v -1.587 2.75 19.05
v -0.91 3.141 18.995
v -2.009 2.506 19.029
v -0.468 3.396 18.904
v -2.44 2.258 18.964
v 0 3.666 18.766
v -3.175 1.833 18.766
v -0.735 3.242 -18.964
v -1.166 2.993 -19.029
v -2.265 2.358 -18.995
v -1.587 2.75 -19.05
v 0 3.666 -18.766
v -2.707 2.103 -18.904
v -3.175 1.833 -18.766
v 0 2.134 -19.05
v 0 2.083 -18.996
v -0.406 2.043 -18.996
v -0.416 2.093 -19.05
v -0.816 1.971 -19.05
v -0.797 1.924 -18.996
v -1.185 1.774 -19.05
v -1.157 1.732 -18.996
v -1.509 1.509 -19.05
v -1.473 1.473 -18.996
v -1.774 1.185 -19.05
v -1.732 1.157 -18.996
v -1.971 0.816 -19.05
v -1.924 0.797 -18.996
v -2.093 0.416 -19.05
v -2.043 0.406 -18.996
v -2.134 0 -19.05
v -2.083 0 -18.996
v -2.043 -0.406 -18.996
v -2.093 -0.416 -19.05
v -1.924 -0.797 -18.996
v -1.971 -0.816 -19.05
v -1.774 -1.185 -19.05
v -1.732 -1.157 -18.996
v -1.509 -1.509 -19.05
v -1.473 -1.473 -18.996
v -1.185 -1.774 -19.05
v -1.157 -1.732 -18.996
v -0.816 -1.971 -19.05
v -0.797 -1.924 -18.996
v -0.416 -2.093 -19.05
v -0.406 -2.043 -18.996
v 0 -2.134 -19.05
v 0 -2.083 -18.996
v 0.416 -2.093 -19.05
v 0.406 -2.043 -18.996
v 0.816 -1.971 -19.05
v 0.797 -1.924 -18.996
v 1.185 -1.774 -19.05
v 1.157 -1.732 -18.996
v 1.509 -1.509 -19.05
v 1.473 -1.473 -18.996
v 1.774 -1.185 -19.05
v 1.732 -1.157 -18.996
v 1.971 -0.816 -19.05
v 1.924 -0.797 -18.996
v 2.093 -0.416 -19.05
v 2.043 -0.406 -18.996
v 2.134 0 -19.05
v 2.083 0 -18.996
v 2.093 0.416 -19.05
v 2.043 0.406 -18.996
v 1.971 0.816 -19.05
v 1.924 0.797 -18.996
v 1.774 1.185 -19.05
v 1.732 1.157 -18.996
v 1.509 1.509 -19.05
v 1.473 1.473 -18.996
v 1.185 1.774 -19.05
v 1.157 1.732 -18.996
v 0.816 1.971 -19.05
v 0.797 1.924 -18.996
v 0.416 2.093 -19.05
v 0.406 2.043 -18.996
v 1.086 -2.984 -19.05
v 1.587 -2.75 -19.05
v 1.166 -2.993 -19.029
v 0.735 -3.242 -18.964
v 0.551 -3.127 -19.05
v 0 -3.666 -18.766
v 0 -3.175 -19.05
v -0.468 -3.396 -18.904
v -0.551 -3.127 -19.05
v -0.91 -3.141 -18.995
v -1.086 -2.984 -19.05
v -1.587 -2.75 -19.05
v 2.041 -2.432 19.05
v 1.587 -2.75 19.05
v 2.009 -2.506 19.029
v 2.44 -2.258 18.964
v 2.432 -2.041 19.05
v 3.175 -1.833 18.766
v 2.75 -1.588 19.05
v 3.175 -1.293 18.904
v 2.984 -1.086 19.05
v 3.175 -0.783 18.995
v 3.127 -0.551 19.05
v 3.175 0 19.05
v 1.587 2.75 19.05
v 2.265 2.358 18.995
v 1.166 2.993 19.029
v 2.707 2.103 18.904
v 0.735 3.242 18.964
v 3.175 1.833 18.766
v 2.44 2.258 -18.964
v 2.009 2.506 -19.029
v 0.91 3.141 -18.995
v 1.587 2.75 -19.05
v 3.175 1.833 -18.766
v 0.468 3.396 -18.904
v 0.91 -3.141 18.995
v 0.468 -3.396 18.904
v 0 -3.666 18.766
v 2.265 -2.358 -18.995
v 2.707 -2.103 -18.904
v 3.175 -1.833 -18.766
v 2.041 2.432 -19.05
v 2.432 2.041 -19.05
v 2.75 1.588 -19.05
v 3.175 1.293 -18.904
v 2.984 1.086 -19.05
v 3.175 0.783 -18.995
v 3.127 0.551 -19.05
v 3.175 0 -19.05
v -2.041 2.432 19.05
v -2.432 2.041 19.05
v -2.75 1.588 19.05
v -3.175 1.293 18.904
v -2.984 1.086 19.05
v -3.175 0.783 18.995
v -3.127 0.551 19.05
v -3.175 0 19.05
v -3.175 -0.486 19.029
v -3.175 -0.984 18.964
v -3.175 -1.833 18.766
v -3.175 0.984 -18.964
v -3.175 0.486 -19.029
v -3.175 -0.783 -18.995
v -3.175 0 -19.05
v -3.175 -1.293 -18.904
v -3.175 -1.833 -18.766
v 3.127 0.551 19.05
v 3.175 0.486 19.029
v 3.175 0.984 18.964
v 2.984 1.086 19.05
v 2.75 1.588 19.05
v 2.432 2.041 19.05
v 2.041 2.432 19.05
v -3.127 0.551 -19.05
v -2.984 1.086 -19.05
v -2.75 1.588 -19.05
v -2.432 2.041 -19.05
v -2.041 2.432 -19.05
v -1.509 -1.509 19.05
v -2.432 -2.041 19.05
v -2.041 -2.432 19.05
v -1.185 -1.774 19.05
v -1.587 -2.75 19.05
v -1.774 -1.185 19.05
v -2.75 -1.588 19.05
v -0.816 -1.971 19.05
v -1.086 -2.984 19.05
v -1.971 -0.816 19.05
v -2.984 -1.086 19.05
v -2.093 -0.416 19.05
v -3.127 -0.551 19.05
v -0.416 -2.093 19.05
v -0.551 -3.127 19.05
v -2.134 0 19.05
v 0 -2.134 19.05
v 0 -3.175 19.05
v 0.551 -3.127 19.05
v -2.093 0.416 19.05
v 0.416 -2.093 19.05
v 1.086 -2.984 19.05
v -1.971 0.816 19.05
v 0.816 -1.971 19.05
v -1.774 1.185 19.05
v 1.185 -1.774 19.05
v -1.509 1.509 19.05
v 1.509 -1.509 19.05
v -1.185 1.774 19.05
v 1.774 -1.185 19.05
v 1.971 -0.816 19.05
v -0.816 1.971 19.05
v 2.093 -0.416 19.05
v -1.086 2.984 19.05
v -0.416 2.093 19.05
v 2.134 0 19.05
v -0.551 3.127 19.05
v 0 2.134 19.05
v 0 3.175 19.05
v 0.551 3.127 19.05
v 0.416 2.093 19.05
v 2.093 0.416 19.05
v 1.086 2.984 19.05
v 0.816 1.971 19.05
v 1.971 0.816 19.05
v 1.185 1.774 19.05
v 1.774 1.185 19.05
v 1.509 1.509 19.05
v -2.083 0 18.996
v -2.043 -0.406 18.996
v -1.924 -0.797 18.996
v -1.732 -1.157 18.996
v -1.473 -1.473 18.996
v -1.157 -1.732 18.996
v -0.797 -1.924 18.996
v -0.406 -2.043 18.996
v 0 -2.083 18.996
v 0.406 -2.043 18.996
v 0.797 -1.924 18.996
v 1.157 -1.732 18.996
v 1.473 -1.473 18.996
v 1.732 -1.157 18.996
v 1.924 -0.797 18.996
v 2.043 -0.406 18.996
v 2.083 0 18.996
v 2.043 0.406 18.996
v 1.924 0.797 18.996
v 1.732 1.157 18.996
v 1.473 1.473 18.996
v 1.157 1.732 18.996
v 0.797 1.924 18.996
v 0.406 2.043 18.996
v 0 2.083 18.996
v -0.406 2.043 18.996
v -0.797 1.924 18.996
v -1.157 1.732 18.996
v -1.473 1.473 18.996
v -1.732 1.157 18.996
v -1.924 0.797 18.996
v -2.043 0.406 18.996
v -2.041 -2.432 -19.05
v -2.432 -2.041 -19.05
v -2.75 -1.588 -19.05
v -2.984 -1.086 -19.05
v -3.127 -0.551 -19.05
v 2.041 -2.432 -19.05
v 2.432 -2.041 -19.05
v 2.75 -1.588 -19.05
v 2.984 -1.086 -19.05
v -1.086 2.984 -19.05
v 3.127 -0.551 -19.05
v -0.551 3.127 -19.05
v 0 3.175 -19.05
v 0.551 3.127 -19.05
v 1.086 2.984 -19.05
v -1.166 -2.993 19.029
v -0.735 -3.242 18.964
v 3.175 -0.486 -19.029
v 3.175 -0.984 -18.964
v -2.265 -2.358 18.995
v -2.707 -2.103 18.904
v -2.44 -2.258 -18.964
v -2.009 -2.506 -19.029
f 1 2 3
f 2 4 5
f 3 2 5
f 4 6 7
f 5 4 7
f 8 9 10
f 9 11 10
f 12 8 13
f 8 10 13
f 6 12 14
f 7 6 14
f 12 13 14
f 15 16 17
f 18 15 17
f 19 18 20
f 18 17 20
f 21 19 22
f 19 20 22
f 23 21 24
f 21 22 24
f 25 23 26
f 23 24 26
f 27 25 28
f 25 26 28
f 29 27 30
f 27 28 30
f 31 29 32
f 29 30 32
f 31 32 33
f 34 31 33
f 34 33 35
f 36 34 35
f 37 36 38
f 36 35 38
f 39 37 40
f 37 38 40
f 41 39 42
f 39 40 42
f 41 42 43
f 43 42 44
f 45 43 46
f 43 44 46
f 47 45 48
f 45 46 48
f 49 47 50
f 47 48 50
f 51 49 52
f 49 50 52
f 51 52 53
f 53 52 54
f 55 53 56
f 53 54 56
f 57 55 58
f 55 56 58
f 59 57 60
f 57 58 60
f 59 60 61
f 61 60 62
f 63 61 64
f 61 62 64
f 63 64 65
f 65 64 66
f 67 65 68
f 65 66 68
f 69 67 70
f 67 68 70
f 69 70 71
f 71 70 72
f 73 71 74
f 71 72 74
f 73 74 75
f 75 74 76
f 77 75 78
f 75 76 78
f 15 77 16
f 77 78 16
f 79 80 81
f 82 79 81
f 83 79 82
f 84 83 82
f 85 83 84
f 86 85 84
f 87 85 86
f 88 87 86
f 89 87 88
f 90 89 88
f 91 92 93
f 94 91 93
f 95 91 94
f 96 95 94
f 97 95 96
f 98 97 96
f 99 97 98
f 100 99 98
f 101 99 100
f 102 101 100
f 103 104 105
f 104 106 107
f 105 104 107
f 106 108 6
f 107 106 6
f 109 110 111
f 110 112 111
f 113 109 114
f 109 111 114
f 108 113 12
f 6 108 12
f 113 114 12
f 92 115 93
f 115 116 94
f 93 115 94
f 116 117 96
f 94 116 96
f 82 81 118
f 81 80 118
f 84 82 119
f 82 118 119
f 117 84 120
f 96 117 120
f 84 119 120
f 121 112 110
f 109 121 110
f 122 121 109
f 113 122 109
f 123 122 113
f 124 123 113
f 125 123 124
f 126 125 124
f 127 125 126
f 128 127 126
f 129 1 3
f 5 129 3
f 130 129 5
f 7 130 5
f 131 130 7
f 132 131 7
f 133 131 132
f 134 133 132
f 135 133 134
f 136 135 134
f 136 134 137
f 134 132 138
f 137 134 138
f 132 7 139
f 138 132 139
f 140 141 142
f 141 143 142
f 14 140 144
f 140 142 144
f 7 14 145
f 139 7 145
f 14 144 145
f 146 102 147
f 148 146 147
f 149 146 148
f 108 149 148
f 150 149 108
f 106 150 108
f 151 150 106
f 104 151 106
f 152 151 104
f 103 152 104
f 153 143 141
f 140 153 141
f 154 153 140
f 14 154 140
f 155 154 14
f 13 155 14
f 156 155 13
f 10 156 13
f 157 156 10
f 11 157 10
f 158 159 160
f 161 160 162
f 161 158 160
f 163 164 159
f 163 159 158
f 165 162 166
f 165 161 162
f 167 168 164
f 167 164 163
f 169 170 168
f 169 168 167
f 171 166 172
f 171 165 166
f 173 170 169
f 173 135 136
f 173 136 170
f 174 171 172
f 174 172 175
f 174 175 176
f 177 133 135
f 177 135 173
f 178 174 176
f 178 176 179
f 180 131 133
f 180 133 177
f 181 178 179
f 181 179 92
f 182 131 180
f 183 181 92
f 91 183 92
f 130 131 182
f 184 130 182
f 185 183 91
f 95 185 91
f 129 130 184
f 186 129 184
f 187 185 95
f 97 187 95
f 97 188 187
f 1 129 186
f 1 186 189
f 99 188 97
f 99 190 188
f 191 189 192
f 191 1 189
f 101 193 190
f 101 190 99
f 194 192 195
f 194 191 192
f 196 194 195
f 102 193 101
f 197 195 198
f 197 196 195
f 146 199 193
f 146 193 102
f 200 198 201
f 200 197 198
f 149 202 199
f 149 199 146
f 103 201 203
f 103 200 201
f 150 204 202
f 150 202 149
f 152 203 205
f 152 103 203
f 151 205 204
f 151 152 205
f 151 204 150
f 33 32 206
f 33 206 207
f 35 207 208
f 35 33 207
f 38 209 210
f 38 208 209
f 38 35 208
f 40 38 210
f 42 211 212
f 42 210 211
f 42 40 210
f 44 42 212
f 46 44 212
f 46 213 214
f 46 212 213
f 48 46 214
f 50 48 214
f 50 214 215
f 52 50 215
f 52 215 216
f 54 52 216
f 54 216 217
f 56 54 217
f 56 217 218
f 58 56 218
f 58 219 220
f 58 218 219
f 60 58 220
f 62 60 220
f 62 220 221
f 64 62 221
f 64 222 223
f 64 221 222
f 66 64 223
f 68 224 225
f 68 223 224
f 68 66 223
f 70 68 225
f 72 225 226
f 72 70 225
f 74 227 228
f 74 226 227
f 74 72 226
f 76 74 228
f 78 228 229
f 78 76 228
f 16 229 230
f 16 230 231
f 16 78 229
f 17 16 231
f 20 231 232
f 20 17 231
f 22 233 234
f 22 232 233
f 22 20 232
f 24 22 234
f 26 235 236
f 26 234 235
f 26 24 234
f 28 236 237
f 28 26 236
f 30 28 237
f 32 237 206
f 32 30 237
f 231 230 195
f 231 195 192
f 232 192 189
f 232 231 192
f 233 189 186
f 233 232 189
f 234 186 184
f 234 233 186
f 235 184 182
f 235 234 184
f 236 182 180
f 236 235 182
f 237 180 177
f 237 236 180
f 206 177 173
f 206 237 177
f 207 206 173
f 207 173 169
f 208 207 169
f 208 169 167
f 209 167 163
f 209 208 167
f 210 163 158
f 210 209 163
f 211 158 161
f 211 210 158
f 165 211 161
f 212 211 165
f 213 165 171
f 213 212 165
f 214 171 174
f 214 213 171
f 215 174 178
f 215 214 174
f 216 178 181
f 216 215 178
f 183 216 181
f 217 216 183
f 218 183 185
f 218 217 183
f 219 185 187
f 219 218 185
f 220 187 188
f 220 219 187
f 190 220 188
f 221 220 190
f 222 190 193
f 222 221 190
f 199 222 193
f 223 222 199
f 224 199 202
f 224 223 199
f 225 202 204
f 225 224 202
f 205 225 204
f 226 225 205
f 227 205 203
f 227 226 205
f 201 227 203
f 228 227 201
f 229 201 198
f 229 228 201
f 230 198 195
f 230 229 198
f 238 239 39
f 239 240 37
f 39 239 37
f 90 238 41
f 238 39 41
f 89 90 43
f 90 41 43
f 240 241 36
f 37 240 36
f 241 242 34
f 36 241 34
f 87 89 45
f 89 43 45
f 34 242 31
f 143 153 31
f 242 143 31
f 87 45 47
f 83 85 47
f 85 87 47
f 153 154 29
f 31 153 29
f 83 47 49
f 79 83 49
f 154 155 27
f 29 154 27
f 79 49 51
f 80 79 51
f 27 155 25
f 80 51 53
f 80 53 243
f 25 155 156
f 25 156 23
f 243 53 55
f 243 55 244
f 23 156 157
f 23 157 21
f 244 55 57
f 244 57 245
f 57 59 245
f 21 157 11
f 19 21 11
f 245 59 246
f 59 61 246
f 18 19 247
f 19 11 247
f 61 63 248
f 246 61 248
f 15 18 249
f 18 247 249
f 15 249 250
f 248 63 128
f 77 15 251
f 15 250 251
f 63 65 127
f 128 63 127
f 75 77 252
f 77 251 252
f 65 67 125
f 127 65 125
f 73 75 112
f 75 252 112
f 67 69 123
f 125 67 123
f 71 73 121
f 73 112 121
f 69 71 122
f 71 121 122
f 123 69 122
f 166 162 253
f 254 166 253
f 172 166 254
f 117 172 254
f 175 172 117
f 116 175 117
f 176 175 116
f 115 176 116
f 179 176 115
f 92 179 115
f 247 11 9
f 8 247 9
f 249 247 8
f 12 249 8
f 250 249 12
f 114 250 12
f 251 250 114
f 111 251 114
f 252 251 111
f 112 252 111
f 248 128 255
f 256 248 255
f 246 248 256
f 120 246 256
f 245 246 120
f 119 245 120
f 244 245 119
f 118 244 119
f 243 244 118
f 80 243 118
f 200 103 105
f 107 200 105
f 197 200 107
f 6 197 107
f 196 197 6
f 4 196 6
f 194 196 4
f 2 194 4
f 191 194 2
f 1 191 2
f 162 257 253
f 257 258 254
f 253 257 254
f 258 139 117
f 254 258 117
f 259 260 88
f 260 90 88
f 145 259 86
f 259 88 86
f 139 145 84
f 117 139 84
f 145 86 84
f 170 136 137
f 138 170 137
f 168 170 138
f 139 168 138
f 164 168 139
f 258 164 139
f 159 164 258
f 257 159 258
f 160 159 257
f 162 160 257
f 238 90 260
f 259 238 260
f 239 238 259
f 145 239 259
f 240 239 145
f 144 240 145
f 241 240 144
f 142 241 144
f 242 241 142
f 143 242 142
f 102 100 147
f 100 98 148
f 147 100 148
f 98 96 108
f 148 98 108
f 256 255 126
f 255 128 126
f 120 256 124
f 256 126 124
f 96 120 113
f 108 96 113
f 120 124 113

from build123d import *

# Parameters (mm, degrees)
EXTRUDE1_DEPTH          = 19.05
EXTRUDE1_DEPTH_BACK     = 19.05
SKETCH1_R               = 2.0828
SKETCH8_OUTSIDE_W       = 152.724
SKETCH8_OUTSIDE_H       = 153.706
SKETCH8_OUTSIDE_R       = 3.175
EXTRUDE4_DEPTH          = 39.407440143
EXTRUDE4_DRAFT          = -60
MIRROR1_COPY_1_SKETCH_W = 152.724
MIRROR1_COPY_1_SKETCH_H = 153.706
MIRROR1_COPY_1_SKETCH_R = 3.175
MIRROR1_COPY_1_DEPTH    = 39.407440143
MIRROR1_COPY_1_DRAFT    = -60


with BuildPart() as part:
    # Sketch1 → Extrude1 (new, two sides: drawn at the far end of the back side and taken through both)
    with BuildSketch(Plane.XY.offset(-EXTRUDE1_DEPTH_BACK)):
        Polygon((0, 3.666174209), (-3.175, 1.833087105), (-3.175, -1.833087105), (0, -3.666174209), (3.175, -1.833087105), (3.175, 1.833087105), align=None)
        with Locations(Location((0, 0, 0), (0, 0, 180))):
            Circle(SKETCH1_R, mode=Mode.SUBTRACT)
    extrude(amount=EXTRUDE1_DEPTH + EXTRUDE1_DEPTH_BACK)

    # Extrude3 cone 1 section (through the dimple's axis) → Extrude3 (revolve, cut)
    with BuildSketch(Plane(origin=(0, 0, -19.05), x_dir=(0, 1, 0), z_dir=(1, 0, 0))):
        Polygon((0, 0), (2.1336, 0), (0, 2.28800588), align=None)
    extrude3 = revolve(axis=Axis((0, 0, -19.05), (0, 0, 1)), mode=Mode.SUBTRACT)


with BuildPart() as extrude4_tool:
    # Sketch8 outside → Extrude4 (with draft: the straight prism first)
    with BuildSketch(Plane(origin=(0, 0, -19.05), x_dir=(-1, 0, 0), z_dir=(0, 0, -1))):
        Rectangle(SKETCH8_OUTSIDE_W, SKETCH8_OUTSIDE_H)
        Circle(SKETCH8_OUTSIDE_R, mode=Mode.SUBTRACT)
    extrude(amount=-EXTRUDE4_DEPTH)
    # Extrude4: the draft: its side faces are tilted about the plane it starts from
    extrude4_sides = [extrude4_tool.faces().sort_by_distance(p)[0] for p in [
        (0, -76.853, 0.653720071),
        (-76.362, 0, 0.653720071),
        (0, 76.853, 0.653720071),
        (76.362, 0, 0.653720071),
        (3.175, 0, 0.653720071),
    ]]
    draft(extrude4_sides, Plane(origin=(0, 0, -19.05), x_dir=(-1, 0, 0), z_dir=(0, 0, -1)), EXTRUDE4_DRAFT)


with BuildPart() as part_1:
    add(part.part)

    # Extrude4: cut by extrude4_tool
    add(extrude4_tool.part, mode=Mode.SUBTRACT)

    # Mirror1: Extrude3 across plane
    add(extrude3.mirror(Plane.XY), mode=Mode.SUBTRACT)


with BuildPart() as mirror1_copy_1_tool:
    # Mirror1 copy 1 sketch → Mirror1 copy 1 (with draft: the straight prism first)
    with BuildSketch(Plane(origin=(0, 0, 19.05), x_dir=(-1, 0, 0), z_dir=(0, 0, 1))):
        Rectangle(MIRROR1_COPY_1_SKETCH_W, MIRROR1_COPY_1_SKETCH_H)
        Circle(MIRROR1_COPY_1_SKETCH_R, mode=Mode.SUBTRACT)
    extrude(amount=-MIRROR1_COPY_1_DEPTH)
    # Mirror1 copy 1: the draft: its side faces are tilted about the plane it starts from
    mirror1_copy_1_sides = [mirror1_copy_1_tool.faces().sort_by_distance(p)[0] for p in [
        (0, -76.853, -0.653720071),
        (-76.362, 0, -0.653720071),
        (0, 76.853, -0.653720071),
        (76.362, 0, -0.653720071),
        (3.175, 0, -0.653720071),
    ]]
    draft(mirror1_copy_1_sides, Plane(origin=(0, 0, 19.05), x_dir=(-1, 0, 0), z_dir=(0, 0, 1)), MIRROR1_COPY_1_DRAFT)


with BuildPart() as part_2:
    add(part_1.part)

    # Mirror1 copy 1: cut by mirror1_copy_1_tool
    add(mirror1_copy_1_tool.part, mode=Mode.SUBTRACT)


solid = part_2.part
